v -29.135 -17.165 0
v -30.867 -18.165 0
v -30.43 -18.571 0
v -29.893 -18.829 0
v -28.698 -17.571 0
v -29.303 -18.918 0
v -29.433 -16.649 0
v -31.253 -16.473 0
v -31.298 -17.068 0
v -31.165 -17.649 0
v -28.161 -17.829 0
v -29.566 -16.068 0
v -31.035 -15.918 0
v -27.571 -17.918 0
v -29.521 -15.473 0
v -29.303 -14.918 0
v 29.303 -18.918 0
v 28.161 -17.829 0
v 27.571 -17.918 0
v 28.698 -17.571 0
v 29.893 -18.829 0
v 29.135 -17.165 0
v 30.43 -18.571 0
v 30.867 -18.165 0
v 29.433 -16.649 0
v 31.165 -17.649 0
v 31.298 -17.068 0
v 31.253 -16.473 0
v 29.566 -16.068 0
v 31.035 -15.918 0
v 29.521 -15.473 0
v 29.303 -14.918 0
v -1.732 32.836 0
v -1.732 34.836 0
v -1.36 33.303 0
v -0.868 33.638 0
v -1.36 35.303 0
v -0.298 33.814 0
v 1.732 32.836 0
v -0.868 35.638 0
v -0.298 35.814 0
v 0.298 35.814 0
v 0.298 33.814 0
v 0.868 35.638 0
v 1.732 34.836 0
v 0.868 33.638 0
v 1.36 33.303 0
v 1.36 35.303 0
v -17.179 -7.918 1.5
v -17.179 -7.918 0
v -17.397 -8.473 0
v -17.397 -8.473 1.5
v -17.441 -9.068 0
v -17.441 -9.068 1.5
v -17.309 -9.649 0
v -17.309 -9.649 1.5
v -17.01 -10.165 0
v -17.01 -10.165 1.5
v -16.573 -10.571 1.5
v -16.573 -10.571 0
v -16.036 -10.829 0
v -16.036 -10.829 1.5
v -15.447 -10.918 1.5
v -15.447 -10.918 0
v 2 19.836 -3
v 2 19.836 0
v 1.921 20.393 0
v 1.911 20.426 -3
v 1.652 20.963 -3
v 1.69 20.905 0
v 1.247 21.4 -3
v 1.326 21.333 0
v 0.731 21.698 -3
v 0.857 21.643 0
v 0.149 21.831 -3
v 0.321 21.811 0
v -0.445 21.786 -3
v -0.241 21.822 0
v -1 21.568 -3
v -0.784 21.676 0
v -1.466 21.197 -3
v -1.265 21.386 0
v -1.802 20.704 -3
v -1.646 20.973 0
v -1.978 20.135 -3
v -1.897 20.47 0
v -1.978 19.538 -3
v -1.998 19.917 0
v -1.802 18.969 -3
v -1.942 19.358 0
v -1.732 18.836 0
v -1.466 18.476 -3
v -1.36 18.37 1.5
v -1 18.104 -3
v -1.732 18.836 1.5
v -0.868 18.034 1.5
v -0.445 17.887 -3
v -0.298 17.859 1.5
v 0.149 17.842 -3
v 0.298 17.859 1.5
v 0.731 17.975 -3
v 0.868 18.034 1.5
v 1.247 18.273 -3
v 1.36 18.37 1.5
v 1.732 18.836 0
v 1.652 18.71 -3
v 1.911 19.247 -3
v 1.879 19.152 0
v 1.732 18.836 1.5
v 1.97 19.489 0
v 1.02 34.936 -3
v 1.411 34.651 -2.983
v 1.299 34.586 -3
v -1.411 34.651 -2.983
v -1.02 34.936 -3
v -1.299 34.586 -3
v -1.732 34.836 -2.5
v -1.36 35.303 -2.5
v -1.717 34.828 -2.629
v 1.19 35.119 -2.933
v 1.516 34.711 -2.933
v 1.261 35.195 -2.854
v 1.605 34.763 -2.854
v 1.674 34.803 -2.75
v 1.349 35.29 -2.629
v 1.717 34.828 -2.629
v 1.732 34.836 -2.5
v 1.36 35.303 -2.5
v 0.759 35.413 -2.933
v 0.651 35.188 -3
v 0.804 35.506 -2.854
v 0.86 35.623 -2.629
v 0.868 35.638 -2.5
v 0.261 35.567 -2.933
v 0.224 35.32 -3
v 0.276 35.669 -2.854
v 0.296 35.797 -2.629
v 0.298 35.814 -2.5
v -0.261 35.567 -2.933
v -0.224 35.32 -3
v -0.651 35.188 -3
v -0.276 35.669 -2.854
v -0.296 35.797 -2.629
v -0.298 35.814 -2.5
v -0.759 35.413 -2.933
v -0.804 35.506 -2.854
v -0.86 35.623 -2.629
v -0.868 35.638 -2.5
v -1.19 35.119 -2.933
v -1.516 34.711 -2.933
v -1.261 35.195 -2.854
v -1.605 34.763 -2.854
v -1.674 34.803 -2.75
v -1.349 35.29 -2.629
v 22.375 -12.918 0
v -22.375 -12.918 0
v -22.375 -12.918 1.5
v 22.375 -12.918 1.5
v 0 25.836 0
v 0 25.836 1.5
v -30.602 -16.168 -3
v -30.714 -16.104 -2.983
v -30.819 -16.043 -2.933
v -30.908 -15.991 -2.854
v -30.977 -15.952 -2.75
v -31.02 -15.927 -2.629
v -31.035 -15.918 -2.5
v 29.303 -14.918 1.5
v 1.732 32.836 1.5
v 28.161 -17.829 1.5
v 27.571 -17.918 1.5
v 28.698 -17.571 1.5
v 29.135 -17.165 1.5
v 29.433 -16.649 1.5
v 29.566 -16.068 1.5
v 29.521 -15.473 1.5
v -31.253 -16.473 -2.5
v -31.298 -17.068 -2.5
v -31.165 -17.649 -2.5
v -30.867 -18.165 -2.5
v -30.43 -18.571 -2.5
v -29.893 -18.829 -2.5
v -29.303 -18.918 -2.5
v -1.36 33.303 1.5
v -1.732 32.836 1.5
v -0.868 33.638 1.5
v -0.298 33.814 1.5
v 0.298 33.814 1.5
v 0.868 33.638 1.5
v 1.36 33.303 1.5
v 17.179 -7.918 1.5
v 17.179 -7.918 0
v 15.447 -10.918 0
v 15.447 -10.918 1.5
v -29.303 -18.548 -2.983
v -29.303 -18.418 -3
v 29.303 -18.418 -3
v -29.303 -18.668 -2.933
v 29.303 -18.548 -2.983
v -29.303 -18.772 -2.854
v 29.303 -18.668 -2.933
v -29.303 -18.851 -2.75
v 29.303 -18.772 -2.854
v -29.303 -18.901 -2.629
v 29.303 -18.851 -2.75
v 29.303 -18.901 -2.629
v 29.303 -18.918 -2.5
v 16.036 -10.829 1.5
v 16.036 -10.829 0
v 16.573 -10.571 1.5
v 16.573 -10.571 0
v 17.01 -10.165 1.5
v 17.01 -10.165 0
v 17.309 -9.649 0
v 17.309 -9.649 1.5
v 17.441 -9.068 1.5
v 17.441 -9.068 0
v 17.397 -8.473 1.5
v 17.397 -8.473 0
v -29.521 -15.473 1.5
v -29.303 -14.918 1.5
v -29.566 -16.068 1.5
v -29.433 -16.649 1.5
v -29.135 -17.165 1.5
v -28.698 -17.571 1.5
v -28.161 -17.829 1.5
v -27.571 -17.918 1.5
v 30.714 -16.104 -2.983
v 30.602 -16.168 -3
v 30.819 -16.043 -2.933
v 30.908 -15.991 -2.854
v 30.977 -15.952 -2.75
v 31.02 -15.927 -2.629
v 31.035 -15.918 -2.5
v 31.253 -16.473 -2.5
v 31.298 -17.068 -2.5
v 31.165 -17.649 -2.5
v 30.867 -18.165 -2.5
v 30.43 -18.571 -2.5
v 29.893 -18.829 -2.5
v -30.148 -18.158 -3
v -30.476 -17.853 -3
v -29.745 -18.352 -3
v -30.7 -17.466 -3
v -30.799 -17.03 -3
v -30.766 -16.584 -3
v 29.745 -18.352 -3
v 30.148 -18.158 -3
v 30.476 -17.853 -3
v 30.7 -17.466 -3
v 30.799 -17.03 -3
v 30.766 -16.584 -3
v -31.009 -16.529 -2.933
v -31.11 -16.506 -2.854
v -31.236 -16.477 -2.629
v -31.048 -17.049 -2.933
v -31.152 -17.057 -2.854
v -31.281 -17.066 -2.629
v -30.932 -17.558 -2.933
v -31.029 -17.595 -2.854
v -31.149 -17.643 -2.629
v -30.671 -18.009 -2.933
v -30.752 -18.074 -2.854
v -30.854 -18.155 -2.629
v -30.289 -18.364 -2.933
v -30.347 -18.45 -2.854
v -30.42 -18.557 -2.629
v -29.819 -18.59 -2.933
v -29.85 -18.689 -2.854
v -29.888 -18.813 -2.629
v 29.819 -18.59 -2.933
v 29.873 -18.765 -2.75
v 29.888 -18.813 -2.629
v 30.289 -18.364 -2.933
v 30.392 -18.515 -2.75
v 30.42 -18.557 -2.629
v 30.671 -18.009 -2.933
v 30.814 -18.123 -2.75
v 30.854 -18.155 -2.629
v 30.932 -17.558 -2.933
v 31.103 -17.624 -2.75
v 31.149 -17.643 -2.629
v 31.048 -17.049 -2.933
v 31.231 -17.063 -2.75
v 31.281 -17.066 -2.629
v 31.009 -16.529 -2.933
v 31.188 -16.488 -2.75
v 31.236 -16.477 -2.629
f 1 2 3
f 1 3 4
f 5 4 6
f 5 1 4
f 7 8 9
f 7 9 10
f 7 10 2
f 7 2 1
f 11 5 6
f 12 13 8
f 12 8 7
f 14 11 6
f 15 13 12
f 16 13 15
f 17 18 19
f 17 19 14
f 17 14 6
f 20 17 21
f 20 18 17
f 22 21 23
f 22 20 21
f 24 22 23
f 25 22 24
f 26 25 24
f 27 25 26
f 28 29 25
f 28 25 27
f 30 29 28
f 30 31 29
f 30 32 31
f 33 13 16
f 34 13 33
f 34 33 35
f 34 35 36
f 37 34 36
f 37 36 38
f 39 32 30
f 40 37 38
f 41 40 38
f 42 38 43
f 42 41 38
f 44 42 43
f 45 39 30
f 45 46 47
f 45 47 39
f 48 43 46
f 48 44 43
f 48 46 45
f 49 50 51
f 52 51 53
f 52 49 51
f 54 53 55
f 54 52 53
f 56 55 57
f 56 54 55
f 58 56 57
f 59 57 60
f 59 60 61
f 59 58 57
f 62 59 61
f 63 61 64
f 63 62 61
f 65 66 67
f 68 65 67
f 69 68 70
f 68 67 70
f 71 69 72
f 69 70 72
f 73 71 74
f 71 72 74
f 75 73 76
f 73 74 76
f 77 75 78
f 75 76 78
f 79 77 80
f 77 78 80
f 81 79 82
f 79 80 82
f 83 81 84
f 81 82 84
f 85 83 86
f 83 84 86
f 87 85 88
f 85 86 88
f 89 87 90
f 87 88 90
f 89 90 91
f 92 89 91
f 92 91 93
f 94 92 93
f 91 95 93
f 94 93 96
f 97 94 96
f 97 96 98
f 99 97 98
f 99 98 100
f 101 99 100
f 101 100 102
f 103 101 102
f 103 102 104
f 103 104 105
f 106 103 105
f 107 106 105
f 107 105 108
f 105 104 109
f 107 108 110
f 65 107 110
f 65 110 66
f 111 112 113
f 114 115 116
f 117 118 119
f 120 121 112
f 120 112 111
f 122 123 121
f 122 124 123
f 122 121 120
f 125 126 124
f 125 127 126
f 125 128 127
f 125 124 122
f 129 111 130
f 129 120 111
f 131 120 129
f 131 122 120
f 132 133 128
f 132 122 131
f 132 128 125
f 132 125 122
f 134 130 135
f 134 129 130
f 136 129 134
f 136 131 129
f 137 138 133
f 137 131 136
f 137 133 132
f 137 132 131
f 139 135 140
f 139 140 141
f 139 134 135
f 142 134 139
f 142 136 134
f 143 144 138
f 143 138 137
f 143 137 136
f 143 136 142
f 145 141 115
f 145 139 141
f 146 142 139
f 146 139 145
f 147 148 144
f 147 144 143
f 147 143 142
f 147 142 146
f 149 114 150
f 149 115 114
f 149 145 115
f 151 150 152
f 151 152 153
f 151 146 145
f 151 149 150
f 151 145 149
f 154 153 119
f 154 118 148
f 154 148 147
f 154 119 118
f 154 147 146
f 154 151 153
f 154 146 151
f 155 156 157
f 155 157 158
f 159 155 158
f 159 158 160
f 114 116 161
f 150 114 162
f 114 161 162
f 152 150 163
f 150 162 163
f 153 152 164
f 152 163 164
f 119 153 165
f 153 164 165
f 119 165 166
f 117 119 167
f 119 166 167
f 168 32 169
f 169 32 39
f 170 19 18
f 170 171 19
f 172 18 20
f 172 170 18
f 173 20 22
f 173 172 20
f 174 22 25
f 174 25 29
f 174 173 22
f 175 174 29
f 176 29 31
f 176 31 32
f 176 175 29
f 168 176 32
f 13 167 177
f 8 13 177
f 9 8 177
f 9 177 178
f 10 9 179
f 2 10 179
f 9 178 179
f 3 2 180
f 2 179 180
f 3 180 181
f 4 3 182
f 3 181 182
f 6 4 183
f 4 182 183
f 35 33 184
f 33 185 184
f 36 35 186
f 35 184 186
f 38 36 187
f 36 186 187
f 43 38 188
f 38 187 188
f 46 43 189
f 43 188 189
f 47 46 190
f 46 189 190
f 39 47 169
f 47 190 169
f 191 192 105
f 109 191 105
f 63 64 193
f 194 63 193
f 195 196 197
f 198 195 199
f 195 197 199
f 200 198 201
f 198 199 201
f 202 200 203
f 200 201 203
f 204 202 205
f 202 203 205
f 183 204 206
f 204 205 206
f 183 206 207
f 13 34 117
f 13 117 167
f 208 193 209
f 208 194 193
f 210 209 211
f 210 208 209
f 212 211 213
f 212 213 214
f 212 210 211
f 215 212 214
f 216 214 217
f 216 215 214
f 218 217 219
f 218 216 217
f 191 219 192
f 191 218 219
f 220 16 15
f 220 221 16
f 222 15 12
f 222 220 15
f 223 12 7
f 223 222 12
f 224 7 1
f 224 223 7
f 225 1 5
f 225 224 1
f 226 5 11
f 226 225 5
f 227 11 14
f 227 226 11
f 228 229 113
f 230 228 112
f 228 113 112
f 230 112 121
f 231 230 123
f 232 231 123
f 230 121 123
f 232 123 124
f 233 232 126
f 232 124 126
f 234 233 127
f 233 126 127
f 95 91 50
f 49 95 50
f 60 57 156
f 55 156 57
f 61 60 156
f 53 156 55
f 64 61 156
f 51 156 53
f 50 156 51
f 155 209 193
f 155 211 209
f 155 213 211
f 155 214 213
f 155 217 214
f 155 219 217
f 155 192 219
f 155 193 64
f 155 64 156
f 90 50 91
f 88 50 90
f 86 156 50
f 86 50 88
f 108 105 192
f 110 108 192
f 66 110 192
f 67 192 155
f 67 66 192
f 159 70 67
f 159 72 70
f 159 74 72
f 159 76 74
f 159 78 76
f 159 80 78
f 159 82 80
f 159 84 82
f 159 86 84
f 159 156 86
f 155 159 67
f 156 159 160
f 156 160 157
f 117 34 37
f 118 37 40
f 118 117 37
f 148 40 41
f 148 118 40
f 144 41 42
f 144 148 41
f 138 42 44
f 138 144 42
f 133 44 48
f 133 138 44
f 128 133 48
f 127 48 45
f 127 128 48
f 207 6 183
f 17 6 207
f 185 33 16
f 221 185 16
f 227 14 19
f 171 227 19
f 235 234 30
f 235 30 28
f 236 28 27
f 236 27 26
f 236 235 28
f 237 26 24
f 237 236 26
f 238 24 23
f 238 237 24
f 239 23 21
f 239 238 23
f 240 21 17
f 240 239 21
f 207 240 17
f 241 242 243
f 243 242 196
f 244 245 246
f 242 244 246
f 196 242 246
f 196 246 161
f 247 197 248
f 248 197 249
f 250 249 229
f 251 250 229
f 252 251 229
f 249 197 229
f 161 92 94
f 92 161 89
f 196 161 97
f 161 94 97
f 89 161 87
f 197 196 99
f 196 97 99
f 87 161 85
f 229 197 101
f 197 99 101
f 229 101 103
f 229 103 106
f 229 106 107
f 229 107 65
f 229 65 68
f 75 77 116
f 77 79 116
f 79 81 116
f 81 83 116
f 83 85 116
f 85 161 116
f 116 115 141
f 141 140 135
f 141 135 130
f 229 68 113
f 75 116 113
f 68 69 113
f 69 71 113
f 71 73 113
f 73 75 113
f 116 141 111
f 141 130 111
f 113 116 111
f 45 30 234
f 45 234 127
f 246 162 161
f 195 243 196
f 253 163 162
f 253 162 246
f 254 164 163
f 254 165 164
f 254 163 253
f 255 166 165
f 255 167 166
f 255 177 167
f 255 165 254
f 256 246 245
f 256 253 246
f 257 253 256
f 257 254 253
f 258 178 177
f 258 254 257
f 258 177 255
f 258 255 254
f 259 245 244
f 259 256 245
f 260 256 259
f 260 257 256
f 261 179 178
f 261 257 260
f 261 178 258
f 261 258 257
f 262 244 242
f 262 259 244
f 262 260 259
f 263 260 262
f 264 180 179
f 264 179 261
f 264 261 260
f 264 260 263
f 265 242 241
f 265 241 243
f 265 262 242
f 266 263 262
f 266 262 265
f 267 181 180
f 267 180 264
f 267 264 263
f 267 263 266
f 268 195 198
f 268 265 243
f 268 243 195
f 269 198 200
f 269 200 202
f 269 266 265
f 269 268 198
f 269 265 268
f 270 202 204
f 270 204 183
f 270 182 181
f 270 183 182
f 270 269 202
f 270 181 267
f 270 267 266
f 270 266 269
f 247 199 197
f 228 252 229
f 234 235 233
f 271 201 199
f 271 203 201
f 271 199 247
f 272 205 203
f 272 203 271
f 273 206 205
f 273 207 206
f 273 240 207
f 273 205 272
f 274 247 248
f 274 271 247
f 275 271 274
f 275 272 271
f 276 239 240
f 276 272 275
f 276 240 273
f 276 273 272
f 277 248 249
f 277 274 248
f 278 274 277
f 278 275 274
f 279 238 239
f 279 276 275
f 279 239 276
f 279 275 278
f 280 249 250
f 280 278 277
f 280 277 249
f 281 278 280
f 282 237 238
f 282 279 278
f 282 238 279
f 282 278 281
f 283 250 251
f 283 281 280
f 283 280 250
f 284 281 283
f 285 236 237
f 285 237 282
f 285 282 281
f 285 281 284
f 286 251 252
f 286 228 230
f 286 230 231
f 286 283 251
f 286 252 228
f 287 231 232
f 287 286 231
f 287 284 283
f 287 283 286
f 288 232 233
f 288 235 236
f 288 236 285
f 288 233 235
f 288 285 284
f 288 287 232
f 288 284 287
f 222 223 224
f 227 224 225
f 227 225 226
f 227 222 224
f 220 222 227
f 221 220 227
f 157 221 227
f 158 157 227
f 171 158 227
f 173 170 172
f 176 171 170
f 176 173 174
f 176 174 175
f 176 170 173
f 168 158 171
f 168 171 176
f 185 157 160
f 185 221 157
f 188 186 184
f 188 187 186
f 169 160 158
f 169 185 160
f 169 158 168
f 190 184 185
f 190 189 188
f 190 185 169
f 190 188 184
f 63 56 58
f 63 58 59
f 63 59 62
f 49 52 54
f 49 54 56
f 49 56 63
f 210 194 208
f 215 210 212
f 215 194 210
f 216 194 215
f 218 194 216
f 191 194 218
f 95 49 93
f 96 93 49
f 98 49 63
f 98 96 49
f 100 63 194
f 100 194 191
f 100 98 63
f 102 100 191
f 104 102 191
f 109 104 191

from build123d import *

# Parameters (mm, degrees)
PAD008_DEPTH    = 3
PAD009_DEPTH    = 1.5
POCKET_DEPTH    = 5
FILLET_R        = 2
FILLET001_R     = 2
SKETCH023_R     = 2
POCKET001_DEPTH = 4.501
FILLET002_R     = 0.5


with BuildPart() as part:
    # Sketch020 → Pad008 (new body)
    with BuildSketch(Plane.XY):
        Polygon((0, 37.8364245462), (-32.7673048454, -18.9182122731), (32.7673048454, -18.9182122731), align=None)
    extrude(amount=-PAD008_DEPTH)

    # Sketch021 → Pad009 (join)
    with BuildSketch(Plane.XY):
        Polygon((0, 35.8364245464), (-31.035254038, -17.9182122732), (31.035254038, -17.9182122732), align=None)
    extrude(amount=PAD009_DEPTH)

    # Sketch022 → Pocket (cut)
    with BuildSketch(Plane.XY):
        Polygon((0, 25.8364245462), (-22.375, -12.9182122731), (22.375, -12.9182122731), align=None)
        Polygon((0, 21.8364245462), (-18.9108983849, -10.9182122731), (18.9108983849, -10.9182122731), align=None, mode=Mode.SUBTRACT)
    extrude(amount=POCKET_DEPTH, mode=Mode.SUBTRACT)

    # Fillet
    fillet_edges = [part.edges().sort_by_distance(p)[0] for p in [
        (-32.767305, -18.918212, -1.5),
        (32.767305, -18.918212, -1.5),
        (0, 37.836425, -1.5),
        (31.035254, -17.918212, 0.75),
        (-31.035254, -17.918212, 0.75),
        (0, 35.836425, 0.75),
    ]]
    fillet(fillet_edges, radius=FILLET_R)

    # Fillet001
    fillet001_edges = [part.edges().sort_by_distance(p)[0] for p in [
        (0, 21.836425, 0.75),
        (18.910898, -10.918212, 0.75),
        (-18.910898, -10.918212, 0.75),
    ]]
    fillet(fillet001_edges, radius=FILLET001_R)

    # Sketch023 (on Face11 of Fillet001) → Pocket001 (cut, through all)
    with BuildSketch(Plane.XY.offset(1.5)):
        with Locations((0, 19.8364245462)):
            Circle(SKETCH023_R)
    extrude(amount=-POCKET001_DEPTH, mode=Mode.SUBTRACT)

    # Fillet002
    fillet002_edges = [part.edges().sort_by_distance(p)[0] for p in [
        (16.383652, 9.459106, -3),
    ]]
    fillet(fillet002_edges, radius=FILLET002_R)


solid = part.part
